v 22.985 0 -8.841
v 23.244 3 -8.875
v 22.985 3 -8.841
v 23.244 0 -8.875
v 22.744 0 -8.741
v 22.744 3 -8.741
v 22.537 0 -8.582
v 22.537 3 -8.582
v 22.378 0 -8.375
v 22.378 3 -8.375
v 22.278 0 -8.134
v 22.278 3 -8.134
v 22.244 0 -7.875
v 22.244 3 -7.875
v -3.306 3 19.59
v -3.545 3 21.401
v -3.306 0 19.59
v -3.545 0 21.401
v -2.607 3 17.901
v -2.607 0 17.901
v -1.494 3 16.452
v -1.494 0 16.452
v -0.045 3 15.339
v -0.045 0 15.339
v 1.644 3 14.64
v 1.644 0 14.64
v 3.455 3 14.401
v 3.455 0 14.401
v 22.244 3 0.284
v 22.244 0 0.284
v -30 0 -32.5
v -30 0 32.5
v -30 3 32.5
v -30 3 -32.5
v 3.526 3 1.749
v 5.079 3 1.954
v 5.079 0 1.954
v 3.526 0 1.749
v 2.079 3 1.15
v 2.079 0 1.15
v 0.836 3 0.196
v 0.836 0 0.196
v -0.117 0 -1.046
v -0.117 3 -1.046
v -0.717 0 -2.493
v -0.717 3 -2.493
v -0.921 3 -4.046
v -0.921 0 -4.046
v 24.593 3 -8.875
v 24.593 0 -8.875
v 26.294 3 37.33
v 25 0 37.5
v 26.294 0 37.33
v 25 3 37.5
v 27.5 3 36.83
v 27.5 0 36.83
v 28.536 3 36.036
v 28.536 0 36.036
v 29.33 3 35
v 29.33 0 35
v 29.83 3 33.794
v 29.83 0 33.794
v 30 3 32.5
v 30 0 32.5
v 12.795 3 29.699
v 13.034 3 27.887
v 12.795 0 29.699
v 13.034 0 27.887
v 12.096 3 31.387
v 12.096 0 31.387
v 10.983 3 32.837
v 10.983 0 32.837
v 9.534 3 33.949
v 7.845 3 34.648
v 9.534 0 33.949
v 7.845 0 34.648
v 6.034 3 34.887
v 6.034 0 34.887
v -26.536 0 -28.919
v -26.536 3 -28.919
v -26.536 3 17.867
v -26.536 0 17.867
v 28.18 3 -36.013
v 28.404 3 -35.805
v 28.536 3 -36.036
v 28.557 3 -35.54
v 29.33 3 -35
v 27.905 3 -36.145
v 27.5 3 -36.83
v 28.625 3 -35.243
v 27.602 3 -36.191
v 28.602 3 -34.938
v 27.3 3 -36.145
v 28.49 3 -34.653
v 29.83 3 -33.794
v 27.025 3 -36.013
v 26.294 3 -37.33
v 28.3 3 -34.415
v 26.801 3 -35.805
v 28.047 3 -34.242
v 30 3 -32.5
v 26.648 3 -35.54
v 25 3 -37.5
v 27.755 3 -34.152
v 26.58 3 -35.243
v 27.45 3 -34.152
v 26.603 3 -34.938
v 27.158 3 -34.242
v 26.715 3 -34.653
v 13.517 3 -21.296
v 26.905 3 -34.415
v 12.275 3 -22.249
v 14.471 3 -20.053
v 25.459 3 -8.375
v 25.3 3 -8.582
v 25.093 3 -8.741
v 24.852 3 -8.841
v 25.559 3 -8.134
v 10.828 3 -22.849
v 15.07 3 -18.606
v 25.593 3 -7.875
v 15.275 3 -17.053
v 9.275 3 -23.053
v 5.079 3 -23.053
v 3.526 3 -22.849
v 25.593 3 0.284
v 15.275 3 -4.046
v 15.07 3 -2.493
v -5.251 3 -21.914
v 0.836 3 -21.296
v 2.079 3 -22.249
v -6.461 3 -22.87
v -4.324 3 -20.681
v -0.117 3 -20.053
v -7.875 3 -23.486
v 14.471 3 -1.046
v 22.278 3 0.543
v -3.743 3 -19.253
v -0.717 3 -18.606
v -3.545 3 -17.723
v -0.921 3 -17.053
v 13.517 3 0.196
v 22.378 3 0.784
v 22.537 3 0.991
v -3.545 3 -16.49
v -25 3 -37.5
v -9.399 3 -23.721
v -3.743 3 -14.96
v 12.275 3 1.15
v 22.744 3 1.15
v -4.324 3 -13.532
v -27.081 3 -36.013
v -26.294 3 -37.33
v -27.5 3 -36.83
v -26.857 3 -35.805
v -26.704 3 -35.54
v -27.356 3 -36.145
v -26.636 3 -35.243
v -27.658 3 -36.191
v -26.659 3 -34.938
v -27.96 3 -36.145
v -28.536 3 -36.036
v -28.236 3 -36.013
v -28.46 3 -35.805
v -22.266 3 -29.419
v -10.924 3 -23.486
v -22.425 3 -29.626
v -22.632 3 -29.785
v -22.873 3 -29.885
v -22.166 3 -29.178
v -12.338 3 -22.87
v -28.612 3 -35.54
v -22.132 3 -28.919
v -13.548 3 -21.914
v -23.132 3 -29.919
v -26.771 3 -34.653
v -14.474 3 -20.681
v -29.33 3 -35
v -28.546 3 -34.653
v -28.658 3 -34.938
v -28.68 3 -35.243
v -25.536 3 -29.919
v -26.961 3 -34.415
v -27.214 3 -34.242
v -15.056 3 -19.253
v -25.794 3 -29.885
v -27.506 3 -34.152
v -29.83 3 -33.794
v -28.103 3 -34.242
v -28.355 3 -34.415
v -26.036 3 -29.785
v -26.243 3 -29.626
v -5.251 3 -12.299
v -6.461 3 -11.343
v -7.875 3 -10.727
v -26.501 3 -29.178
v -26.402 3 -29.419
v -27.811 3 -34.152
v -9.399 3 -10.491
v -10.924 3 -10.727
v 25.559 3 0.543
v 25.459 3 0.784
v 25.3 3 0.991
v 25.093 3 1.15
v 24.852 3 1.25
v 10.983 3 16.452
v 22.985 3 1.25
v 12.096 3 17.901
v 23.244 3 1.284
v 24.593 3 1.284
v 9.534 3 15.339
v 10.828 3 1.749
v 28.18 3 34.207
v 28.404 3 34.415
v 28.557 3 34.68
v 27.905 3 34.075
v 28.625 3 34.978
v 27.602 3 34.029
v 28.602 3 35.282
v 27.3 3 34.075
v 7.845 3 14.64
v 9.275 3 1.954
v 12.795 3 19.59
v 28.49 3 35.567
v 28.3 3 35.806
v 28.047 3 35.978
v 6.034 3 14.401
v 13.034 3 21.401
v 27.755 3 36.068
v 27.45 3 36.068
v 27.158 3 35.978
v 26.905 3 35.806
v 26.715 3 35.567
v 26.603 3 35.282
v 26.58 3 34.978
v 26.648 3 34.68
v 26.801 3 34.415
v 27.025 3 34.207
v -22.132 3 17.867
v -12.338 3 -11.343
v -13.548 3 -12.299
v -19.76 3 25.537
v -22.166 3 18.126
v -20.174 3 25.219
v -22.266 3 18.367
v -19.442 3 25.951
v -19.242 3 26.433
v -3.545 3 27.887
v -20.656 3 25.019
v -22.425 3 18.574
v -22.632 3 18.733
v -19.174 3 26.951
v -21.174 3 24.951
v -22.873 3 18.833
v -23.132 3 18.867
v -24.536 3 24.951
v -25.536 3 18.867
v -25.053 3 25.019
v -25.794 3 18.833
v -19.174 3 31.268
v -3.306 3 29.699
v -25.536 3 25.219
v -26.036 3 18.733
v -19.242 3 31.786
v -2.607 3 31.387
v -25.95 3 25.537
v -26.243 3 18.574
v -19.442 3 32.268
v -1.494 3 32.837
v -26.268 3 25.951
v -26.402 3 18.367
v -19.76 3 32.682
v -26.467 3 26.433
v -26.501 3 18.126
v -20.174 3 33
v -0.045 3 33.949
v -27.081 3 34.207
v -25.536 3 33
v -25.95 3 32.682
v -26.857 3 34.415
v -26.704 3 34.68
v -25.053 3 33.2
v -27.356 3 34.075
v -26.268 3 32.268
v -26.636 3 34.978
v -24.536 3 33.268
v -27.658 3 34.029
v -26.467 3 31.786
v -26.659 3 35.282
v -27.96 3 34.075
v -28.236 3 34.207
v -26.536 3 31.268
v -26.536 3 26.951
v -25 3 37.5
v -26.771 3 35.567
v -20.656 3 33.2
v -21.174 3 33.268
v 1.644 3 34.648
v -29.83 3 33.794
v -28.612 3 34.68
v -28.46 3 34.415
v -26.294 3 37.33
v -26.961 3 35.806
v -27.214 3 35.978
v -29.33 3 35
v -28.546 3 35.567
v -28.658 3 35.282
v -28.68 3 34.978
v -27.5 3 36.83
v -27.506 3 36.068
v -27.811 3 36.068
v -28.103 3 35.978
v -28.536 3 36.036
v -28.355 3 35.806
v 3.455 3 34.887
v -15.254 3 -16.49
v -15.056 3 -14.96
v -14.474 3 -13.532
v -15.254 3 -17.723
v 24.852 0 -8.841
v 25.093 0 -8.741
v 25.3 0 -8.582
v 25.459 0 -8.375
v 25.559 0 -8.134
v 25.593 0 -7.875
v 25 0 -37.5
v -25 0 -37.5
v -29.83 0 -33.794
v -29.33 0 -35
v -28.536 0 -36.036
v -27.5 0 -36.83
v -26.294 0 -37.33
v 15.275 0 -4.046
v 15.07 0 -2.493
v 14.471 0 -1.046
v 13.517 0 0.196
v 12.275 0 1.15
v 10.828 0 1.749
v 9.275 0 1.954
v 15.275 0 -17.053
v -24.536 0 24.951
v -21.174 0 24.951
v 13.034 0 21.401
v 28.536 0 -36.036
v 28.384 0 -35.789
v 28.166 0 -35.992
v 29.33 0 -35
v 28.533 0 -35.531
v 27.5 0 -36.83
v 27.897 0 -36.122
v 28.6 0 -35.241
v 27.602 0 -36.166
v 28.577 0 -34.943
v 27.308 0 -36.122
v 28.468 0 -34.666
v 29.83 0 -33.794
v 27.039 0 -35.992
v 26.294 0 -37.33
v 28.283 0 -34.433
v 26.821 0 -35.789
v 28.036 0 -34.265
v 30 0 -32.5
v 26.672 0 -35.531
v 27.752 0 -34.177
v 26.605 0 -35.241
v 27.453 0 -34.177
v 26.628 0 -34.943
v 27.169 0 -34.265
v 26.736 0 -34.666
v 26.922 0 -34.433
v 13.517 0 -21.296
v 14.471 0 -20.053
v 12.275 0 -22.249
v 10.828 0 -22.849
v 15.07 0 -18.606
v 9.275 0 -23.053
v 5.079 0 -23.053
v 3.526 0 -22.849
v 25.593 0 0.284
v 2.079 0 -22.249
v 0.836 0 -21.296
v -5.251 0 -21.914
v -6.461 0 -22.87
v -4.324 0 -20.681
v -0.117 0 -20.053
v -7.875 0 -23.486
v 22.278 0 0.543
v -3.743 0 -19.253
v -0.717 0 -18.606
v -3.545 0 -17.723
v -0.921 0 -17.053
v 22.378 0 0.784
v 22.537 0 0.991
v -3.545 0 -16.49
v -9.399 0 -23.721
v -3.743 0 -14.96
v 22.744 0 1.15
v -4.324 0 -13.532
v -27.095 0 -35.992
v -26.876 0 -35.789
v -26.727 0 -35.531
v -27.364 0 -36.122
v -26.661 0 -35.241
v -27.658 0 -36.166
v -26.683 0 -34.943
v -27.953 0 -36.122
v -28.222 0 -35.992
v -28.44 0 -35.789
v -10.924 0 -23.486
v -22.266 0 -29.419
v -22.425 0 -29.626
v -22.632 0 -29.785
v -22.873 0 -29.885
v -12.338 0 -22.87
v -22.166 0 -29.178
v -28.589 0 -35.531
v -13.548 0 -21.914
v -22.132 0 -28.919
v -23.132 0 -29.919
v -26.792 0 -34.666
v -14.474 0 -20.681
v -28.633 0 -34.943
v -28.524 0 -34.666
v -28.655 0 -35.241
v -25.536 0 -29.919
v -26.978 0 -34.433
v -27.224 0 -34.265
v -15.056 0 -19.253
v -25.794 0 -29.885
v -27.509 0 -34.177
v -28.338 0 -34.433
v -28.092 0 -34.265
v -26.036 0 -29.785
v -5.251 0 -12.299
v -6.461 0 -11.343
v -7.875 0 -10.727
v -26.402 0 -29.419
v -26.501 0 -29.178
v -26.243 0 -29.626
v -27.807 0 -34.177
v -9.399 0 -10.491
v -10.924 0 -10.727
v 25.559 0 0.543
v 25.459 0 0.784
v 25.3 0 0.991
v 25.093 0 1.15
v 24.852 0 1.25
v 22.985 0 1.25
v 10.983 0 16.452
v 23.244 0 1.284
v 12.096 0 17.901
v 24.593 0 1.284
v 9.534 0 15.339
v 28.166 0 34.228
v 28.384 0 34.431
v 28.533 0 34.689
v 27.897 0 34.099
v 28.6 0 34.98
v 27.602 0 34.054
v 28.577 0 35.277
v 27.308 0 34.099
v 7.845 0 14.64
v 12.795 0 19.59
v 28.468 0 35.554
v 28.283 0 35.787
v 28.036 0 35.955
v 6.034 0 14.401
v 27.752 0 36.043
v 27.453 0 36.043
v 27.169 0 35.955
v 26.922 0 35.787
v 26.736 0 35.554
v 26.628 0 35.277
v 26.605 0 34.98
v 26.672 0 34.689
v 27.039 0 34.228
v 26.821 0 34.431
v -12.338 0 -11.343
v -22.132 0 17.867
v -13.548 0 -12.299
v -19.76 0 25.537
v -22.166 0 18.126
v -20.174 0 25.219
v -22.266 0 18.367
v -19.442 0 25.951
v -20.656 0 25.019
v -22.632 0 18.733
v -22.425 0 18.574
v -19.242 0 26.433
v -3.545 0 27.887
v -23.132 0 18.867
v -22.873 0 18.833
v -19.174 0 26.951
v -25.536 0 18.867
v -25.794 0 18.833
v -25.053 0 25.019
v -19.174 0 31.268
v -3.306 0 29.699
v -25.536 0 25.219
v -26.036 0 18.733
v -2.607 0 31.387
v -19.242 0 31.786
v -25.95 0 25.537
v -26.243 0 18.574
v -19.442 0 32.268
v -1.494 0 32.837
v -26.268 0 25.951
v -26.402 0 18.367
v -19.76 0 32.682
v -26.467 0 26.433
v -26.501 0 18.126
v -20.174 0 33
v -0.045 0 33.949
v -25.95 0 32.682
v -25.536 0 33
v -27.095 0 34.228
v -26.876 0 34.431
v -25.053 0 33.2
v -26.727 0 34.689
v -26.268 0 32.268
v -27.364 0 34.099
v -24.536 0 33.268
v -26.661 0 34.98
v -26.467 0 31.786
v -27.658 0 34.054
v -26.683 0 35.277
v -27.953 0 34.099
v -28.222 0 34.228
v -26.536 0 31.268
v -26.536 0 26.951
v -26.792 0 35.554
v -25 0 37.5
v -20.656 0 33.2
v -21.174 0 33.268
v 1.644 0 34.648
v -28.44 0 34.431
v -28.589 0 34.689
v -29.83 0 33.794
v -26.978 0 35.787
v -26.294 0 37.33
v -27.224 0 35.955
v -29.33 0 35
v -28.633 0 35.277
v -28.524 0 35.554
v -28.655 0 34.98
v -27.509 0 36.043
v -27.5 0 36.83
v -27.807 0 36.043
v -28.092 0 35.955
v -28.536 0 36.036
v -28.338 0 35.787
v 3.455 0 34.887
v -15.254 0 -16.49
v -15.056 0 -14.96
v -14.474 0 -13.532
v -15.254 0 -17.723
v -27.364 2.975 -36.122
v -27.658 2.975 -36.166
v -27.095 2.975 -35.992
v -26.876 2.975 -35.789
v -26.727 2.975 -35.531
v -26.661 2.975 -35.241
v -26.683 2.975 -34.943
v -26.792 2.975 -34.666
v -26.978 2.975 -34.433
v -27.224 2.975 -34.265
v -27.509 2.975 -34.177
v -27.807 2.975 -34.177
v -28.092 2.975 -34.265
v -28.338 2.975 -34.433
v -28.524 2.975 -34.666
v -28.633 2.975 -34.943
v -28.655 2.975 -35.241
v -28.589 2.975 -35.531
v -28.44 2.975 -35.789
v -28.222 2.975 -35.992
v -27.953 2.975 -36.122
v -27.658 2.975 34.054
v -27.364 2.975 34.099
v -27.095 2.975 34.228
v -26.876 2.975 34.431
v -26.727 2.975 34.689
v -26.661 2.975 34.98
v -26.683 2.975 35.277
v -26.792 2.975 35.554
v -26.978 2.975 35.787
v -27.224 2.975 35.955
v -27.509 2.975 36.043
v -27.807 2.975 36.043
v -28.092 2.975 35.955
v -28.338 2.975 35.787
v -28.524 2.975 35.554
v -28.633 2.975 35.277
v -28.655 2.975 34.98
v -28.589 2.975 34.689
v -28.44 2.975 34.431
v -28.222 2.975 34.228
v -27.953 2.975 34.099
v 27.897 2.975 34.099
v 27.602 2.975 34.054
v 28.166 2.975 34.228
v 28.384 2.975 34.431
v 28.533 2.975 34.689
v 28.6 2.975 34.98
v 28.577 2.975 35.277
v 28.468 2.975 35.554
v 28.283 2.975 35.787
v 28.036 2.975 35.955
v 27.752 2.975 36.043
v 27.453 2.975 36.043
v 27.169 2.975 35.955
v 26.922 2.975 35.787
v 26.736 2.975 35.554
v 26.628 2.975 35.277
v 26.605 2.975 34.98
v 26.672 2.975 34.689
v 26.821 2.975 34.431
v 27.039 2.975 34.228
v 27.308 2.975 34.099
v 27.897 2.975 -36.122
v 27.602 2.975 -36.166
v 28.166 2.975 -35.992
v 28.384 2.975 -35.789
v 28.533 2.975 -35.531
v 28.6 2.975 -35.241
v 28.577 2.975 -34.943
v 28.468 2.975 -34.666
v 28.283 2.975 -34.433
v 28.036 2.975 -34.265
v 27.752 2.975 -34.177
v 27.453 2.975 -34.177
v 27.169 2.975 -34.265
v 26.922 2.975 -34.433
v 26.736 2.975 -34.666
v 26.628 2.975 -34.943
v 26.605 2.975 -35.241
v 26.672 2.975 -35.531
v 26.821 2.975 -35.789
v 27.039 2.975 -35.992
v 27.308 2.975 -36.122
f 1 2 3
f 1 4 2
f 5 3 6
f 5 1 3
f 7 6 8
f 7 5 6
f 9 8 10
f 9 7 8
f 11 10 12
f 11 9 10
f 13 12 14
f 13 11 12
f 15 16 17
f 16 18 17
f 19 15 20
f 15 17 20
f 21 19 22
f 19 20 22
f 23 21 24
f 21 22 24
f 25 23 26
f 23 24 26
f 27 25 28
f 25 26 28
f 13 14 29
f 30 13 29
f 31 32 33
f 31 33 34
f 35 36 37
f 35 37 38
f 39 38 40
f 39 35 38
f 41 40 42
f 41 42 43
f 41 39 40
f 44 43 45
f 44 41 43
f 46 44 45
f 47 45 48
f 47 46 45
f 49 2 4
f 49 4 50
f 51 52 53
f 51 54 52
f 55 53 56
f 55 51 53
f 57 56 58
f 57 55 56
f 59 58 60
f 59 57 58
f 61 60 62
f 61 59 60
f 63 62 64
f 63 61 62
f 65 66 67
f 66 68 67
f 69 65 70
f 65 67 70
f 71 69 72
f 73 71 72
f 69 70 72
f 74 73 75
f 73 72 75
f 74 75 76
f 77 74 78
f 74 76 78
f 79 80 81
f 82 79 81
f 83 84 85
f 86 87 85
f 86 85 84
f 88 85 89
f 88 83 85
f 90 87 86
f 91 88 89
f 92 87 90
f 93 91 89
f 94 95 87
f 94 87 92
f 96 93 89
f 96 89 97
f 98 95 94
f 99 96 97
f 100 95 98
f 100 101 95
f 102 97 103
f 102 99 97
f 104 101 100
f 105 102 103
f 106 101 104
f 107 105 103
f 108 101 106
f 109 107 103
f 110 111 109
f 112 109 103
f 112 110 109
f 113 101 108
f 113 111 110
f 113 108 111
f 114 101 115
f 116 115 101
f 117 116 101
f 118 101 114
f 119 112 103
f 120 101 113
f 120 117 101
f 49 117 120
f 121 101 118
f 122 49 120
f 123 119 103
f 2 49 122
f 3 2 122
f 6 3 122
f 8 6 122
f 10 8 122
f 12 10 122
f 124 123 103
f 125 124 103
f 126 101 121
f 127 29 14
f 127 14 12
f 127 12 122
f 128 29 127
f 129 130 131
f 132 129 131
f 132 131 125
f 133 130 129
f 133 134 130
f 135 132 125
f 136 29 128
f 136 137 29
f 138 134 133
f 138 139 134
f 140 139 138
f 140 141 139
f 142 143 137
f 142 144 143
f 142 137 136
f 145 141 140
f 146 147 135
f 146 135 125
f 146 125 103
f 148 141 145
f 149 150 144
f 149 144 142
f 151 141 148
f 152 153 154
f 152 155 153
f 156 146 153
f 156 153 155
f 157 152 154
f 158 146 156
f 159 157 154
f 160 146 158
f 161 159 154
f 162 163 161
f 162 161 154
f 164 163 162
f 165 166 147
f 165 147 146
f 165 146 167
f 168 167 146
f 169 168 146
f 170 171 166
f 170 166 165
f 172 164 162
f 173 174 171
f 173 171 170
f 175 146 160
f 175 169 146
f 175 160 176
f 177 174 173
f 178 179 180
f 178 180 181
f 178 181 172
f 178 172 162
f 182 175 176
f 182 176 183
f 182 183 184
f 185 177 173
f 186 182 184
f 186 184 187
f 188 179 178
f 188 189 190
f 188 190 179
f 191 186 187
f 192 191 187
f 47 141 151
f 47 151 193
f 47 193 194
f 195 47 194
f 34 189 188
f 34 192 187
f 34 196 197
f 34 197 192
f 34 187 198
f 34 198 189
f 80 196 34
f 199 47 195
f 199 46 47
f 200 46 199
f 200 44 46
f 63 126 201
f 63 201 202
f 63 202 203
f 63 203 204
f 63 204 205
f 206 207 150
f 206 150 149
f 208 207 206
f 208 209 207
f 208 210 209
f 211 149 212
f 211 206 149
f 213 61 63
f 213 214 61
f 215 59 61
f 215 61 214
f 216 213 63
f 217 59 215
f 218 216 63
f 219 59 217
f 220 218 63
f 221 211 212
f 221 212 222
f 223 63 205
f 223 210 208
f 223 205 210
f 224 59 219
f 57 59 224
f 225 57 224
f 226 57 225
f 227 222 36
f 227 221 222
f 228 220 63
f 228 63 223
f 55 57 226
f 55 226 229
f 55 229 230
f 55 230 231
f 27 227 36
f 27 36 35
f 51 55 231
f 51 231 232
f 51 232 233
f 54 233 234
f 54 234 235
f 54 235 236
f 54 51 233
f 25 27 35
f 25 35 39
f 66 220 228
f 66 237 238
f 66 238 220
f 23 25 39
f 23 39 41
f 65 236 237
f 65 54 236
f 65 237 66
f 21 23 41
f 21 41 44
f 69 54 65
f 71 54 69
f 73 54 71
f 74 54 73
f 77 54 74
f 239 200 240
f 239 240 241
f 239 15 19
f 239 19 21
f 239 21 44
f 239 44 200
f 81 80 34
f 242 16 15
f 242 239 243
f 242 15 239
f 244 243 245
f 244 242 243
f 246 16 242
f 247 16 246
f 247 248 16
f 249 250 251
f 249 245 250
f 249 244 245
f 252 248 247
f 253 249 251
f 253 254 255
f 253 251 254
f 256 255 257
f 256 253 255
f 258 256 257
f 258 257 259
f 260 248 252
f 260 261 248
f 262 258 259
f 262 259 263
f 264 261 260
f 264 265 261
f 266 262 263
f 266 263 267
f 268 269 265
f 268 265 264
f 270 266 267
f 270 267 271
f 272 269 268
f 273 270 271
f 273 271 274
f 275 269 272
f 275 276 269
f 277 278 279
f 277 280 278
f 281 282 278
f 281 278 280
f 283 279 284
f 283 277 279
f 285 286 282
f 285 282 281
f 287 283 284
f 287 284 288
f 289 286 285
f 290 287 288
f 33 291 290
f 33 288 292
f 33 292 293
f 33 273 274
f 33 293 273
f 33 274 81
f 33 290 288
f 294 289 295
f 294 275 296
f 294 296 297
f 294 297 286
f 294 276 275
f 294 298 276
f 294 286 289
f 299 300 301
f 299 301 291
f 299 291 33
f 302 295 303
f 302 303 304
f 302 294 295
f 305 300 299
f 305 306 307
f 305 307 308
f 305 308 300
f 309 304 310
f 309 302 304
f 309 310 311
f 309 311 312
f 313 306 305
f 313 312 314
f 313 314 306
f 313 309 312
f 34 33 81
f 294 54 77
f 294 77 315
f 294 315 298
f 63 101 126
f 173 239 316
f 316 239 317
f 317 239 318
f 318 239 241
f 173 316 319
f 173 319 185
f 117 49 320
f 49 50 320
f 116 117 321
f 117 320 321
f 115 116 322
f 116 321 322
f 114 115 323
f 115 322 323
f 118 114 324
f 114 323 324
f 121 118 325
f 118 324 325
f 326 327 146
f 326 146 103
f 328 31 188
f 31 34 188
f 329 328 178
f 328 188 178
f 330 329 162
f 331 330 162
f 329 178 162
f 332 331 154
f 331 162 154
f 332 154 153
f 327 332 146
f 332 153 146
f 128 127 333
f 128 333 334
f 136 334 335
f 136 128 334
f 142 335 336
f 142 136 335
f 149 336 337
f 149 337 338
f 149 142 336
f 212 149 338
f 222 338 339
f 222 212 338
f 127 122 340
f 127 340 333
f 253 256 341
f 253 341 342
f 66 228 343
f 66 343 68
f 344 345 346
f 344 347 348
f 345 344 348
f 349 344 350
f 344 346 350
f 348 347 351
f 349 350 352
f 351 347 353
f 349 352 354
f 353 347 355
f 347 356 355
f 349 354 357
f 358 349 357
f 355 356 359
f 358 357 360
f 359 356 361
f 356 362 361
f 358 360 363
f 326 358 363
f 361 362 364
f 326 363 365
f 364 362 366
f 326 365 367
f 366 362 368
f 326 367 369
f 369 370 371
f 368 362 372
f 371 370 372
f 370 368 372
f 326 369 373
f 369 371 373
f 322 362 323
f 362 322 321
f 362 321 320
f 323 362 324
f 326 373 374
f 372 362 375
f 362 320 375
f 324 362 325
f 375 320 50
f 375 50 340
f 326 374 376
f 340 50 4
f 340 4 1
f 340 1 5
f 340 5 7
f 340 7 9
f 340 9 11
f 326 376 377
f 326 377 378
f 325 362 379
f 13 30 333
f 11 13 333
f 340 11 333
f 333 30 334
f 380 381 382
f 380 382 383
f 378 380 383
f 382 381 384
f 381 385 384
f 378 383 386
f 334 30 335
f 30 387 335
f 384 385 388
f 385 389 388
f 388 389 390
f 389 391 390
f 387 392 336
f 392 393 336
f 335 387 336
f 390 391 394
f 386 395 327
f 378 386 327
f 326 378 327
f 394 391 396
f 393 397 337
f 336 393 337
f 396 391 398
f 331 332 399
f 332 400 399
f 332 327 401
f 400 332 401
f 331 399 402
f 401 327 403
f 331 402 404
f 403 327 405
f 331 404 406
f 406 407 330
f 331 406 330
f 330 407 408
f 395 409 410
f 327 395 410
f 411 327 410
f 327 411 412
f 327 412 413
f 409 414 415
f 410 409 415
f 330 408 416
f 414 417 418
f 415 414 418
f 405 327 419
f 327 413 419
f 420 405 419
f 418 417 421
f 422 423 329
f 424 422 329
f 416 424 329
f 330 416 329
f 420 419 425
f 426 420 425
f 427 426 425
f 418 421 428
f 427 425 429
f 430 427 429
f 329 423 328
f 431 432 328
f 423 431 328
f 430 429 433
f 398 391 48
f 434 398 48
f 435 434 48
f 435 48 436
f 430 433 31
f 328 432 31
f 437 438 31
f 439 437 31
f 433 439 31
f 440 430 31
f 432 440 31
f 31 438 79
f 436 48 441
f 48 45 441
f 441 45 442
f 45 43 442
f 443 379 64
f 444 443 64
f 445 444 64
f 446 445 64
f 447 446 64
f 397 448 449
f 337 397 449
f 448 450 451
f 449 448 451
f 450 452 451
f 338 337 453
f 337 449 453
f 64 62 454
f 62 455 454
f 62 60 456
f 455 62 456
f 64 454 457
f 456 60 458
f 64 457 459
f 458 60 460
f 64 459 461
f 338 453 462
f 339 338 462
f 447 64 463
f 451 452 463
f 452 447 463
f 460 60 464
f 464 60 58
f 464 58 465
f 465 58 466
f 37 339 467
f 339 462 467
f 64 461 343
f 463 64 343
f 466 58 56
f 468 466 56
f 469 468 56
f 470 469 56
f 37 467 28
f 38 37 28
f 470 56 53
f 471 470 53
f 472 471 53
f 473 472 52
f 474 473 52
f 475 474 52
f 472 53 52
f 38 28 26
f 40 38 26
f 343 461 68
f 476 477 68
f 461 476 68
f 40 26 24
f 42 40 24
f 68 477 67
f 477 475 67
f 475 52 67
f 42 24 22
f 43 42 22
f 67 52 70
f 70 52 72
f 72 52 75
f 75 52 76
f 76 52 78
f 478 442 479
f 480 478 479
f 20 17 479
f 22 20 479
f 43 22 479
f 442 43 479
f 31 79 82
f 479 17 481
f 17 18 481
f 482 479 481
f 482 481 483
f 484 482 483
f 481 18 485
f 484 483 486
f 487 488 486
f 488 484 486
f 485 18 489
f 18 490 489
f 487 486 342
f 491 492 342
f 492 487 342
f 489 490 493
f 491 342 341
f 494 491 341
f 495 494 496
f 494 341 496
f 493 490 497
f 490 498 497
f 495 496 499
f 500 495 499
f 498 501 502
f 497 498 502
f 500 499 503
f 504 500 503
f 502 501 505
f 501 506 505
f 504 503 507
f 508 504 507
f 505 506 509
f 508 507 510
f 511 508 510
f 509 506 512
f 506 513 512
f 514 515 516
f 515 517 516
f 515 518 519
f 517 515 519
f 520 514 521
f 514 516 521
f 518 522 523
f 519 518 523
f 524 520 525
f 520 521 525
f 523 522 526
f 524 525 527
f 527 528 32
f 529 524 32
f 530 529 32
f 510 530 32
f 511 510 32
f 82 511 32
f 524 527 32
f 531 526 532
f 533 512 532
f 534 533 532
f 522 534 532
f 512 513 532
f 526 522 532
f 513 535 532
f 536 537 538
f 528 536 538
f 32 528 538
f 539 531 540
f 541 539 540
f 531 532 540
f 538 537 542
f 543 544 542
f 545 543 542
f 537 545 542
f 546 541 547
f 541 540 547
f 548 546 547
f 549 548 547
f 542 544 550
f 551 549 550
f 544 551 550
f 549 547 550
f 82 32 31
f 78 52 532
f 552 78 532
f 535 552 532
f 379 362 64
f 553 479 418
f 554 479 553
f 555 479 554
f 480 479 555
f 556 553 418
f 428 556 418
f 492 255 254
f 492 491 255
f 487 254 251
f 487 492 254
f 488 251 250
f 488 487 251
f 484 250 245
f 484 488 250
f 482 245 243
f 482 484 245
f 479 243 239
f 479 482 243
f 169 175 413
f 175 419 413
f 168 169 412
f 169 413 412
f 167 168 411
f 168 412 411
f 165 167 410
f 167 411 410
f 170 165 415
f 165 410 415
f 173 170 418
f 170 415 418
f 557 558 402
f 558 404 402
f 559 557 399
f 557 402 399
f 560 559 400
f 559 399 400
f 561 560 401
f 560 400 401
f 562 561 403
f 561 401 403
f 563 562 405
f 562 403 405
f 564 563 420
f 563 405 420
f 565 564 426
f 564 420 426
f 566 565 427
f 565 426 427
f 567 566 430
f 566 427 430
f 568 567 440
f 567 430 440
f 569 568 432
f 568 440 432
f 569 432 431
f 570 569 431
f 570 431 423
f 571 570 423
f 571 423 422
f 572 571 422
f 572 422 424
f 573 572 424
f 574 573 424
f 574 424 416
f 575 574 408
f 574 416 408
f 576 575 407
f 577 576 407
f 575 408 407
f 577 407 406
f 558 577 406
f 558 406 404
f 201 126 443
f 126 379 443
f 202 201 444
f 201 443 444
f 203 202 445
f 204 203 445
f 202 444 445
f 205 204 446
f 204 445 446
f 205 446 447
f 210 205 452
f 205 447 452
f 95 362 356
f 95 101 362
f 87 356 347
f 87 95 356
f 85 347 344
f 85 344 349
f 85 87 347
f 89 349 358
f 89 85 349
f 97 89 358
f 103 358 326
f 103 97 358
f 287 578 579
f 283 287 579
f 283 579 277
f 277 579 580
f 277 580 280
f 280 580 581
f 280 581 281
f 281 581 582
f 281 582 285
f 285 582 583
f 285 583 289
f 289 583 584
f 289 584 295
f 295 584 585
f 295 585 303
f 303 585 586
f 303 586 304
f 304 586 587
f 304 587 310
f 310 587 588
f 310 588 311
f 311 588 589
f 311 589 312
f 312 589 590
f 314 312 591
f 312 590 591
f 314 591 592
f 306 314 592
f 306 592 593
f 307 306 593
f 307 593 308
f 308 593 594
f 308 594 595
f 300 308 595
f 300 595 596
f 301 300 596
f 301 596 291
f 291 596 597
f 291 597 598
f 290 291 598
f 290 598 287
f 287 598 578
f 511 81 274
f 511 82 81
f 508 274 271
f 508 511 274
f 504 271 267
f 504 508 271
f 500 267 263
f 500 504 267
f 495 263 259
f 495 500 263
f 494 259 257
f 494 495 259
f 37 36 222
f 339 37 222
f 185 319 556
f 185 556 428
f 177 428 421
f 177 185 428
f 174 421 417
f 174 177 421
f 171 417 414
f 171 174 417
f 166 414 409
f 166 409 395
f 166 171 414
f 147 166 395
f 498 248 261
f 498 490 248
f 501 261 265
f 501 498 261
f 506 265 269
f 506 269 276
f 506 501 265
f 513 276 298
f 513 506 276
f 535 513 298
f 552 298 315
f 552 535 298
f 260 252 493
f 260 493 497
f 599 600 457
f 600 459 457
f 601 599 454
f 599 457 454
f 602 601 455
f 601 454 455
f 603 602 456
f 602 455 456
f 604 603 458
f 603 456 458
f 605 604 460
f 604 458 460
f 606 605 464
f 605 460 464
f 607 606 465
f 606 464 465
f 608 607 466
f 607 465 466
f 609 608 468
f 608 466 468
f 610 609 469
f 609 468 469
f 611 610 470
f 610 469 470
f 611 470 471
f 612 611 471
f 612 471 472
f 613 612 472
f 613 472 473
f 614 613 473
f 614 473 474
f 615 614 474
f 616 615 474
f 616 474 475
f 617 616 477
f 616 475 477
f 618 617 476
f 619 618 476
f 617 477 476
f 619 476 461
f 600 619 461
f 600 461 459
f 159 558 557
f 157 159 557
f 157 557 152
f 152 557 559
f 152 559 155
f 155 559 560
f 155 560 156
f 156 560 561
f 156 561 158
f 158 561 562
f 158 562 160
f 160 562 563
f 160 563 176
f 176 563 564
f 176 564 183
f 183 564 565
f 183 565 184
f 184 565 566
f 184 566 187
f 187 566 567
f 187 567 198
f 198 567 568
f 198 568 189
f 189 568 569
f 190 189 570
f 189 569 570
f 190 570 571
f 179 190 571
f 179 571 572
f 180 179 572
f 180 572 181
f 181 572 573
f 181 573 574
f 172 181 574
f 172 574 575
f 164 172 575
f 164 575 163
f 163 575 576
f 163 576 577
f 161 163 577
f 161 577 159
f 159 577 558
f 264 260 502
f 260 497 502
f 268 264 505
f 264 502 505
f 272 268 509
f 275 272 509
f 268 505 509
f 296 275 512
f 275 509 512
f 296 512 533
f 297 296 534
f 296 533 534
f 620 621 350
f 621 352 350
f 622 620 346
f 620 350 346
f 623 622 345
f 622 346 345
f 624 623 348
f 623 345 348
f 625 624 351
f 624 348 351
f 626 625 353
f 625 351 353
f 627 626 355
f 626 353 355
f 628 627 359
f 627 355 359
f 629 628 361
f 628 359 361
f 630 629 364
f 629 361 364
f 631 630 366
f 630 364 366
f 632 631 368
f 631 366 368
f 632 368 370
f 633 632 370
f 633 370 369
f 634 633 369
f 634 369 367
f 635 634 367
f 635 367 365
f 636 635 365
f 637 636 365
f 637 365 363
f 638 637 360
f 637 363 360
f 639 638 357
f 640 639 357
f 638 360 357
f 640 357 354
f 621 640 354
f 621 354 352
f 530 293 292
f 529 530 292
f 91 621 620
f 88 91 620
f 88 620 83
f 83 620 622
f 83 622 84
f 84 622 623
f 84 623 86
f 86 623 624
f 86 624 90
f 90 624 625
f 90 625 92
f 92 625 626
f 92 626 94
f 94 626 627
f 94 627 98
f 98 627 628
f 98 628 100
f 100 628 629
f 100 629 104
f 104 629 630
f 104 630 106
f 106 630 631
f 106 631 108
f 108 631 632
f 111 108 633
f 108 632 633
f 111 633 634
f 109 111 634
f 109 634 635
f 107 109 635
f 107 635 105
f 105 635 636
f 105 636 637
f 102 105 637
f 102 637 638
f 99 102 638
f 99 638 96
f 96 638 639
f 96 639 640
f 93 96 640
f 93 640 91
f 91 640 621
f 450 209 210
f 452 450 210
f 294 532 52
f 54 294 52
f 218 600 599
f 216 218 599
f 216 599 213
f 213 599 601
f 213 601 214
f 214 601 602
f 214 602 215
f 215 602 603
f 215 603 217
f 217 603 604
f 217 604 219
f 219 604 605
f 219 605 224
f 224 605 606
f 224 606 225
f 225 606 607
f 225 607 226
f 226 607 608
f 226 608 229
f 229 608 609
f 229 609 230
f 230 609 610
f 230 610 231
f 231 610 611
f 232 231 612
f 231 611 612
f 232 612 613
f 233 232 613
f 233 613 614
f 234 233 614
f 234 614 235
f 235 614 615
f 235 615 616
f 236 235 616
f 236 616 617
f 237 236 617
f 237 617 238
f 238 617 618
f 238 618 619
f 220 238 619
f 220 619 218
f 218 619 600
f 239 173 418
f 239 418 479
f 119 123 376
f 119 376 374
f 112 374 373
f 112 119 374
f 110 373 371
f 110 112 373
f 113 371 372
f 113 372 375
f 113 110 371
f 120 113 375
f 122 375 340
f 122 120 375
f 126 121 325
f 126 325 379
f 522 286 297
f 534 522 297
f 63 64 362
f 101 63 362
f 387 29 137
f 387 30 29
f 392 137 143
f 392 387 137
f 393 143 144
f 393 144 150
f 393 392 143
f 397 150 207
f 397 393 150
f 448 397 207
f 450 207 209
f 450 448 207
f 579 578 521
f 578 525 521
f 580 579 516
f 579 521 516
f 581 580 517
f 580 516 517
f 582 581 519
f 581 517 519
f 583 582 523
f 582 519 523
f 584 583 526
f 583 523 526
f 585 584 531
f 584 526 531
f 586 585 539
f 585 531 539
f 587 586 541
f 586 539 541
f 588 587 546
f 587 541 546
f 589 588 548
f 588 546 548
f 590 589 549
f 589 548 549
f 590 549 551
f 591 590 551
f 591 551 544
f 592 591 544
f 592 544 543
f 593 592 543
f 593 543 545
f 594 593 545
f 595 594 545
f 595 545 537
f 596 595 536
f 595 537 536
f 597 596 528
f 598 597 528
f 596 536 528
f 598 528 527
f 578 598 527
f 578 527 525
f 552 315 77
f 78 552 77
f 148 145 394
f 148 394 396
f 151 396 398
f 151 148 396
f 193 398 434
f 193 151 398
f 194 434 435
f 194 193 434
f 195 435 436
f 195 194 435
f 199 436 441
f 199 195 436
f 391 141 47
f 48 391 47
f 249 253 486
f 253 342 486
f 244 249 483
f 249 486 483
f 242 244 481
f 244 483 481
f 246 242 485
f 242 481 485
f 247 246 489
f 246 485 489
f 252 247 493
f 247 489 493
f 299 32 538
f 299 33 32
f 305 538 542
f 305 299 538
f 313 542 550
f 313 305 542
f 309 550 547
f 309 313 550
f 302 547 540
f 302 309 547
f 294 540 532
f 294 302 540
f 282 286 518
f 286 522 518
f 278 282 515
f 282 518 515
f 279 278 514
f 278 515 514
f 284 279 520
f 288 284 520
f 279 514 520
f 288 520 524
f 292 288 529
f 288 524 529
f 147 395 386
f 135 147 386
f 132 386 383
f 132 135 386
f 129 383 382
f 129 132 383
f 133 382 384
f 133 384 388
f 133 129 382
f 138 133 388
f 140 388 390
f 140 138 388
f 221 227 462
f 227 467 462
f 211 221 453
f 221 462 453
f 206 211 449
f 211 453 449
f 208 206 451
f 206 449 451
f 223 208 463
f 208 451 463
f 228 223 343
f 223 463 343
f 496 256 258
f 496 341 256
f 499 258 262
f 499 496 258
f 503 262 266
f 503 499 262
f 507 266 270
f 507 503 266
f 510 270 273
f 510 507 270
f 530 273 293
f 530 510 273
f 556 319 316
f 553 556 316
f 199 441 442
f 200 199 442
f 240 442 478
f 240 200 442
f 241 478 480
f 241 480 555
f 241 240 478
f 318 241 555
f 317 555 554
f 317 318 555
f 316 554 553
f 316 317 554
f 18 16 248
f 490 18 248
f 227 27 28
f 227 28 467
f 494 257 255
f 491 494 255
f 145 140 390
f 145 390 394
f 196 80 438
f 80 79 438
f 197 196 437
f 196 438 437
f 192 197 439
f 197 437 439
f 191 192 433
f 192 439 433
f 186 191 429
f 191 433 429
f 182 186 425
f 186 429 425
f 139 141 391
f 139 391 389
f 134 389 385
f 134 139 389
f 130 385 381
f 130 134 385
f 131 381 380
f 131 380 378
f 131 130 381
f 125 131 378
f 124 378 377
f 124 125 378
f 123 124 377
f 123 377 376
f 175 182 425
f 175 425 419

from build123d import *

# Parameters (mm, degrees)
SKIZZE1_W                                = 60
SKIZZE1_H                                = 75
AUFSATZ_LINEAR_AUSTRAGEN1_DEPTH          = 3
VERRUNDUNG1_R                            = 5
F_2_0_2_DURCHMESSER_BOHRUNG1_D           = 2
F_2_0_2_DURCHMESSER_BOHRUNG1_DEPTH       = 20
F_2_0_2_DURCHMESSER_BOHRUNG1_CSINK_D     = 2.05
F_2_0_2_DURCHMESSER_BOHRUNG1_CSINK_ANGLE = 90
F_2_0_2_DURCHMESSER_BOHRUNG1_TIP         = 0.600860619
SKIZZE4_W                                = 25.006881973
SKIZZE4_H                                = 16.195641819
SKIZZE4_W_2                              = 8.317021013
SKIZZE4_H_2                              = 7.361730429
SKIZZE4_W_3                              = 20.485548402
SKIZZE4_H_3                              = 16.578223094
SKIZZE4_W_4                              = 10.159045801
SKIZZE4_H_4                              = 3.349135978
SKIZZE4_W_5                              = 48.785747421
SKIZZE4_H_5                              = 4.403326981
SKIZZE4_W_6                              = 13.233304068
SKIZZE4_H_6                              = 11.709766254
SCHNITT_LINEAR_AUSTRAGEN1_DEPTH          = 5
VERRUNDUNG2_R                            = 6
VERRUNDUNG3_R                            = 1
VERRUNDUNG4_R                            = 7
VERRUNDUNG5_R                            = 2


with BuildPart() as part:
    # Skizze1 → Aufsatz-Linear austragen1 (new body)
    with BuildSketch(Plane(origin=(0, 0, 0), x_dir=(1, 0, 0), z_dir=(0, 1, 0))):
        Rectangle(SKIZZE1_W, SKIZZE1_H)
    extrude(amount=AUFSATZ_LINEAR_AUSTRAGEN1_DEPTH)

    # Verrundung1
    verrundung1_edges = [part.edges().sort_by_distance(p)[0] for p in [
        (30, 1.5, 37.5),
        (-30, 1.5, 37.5),
        (-30, 1.5, -37.5),
        (30, 1.5, -37.5),
    ]]
    fillet(verrundung1_edges, radius=VERRUNDUNG1_R)

    # Ø2.0 (2) Durchmesser Bohrung1
    with Locations(Plane.ZX.offset(3)):
        with Locations((-35.165927774, 27.602462356), (35.054289908, 27.602462356), (35.054289908, -27.658281289), (-35.165927774, -27.658281289)):
            CounterSinkHole(F_2_0_2_DURCHMESSER_BOHRUNG1_D / 2, F_2_0_2_DURCHMESSER_BOHRUNG1_CSINK_D / 2, depth=F_2_0_2_DURCHMESSER_BOHRUNG1_DEPTH, counter_sink_angle=F_2_0_2_DURCHMESSER_BOHRUNG1_CSINK_ANGLE)
            with Locations((0, 0, -(F_2_0_2_DURCHMESSER_BOHRUNG1_DEPTH + F_2_0_2_DURCHMESSER_BOHRUNG1_TIP / 2))):  # 118° drill point
                Cone(0, F_2_0_2_DURCHMESSER_BOHRUNG1_D / 2, F_2_0_2_DURCHMESSER_BOHRUNG1_TIP, mode=Mode.SUBTRACT)

    # Skizze4 → Schnitt-Linear austragen1 (cut)
    with BuildSketch(Plane.ZX.offset(3)):
        with Locations((-10.549778333, 7.176808516)):
            Rectangle(SKIZZE4_W, SKIZZE4_H)
        with Locations((29.109573547, -22.854668692)):
            Rectangle(SKIZZE4_W_2, SKIZZE4_H_2)
        with Locations((24.644058909, 4.744609303)):
            Rectangle(SKIZZE4_W_3, SKIZZE4_H_3)
        with Locations((-3.795687443, 23.91841278)):
            Rectangle(SKIZZE4_W_4, SKIZZE4_H_4)
        with Locations((-5.526074365, -24.333870416)):
            Rectangle(SKIZZE4_W_5, SKIZZE4_H_5)
        with Locations((-17.106394481, -9.399385371)):
            Rectangle(SKIZZE4_W_6, SKIZZE4_H_6)
    extrude(amount=-SCHNITT_LINEAR_AUSTRAGEN1_DEPTH, mode=Mode.SUBTRACT)

    # Verrundung2
    # the kernel refuses this fillet: 6 mm, written as the material it adds along each edge
    with BuildSketch(Plane(origin=(-15.254268498, 3, -23.723046515), x_dir=(1, 0, 0), z_dir=(0, -1, 0)), Plane(origin=(-3.544502244, 3, -23.723046515), x_dir=(0, 0, 1), z_dir=(0, -1, 0)), Plane(origin=(-3.544502244, 3, -10.489742447), x_dir=(-1, 0, 0), z_dir=(0, -1, 0)), Plane(origin=(-0.921012394, 3, -23.053219319), x_dir=(1, 0, 0), z_dir=(0, -1, 0)), Plane(origin=(15.274629425, 3, -23.053219319), x_dir=(0, 0, 1), z_dir=(0, -1, 0)), Plane(origin=(15.274629425, 3, 1.953662654), x_dir=(-1, 0, 0), z_dir=(0, -1, 0))) as verrundung2_piece_1:
        with BuildLine():
            CenterArc((VERRUNDUNG2_R, VERRUNDUNG2_R), VERRUNDUNG2_R, 180, 90)
            Line((0, VERRUNDUNG2_R), (0, 0))
            Line((0, 0), (VERRUNDUNG2_R, 0))
        make_face()
    extrude(amount=3)
    with BuildSketch(Plane(origin=(-15.254268498, 3, -10.489742447), x_dir=(1, 0, 0), z_dir=(0, -1, 0)), Plane(origin=(-0.921012394, 3, 1.953662654), x_dir=(1, 0, 0), z_dir=(0, -1, 0))) as verrundung2_piece_2:
        with BuildLine():
            CenterArc((VERRUNDUNG2_R, -VERRUNDUNG2_R), VERRUNDUNG2_R, 90, 90)
            Line((0, -VERRUNDUNG2_R), (0, 0))
            Line((0, 0), (VERRUNDUNG2_R, 0))
        make_face()
    extrude(amount=3)

    # Verrundung3
    verrundung3_edges = [part.edges().sort_by_distance(p)[0] for p in [
        (-26.535533906, 1.5, -29.918948075),
        (-22.132206925, 1.5, -29.918948075),
        (-22.132206925, 1.5, 18.866799346),
        (-26.535533906, 1.5, 18.866799346),
        (22.243844791, 1.5, -8.875210343),
        (25.592980769, 1.5, -8.875210343),
        (25.592980769, 1.5, 1.283835458),
        (22.243844791, 1.5, 1.283835458),
    ]]
    fillet(verrundung3_edges, radius=VERRUNDUNG3_R)

    # Verrundung4
    verrundung4_edges = [part.edges().sort_by_distance(p)[0] for p in [
        (-3.544502244, 1.5, 14.401284708),
        (13.03372085, 1.5, 14.401284708),
        (13.03372085, 1.5, 34.88683311),
        (-3.544502244, 1.5, 34.88683311),
    ]]
    fillet(verrundung4_edges, radius=VERRUNDUNG4_R)

    # Verrundung5
    verrundung5_edges = [part.edges().sort_by_distance(p)[0] for p in [
        (-26.535533906, 1.5, 24.95106304),
        (-19.173803477, 1.5, 24.95106304),
        (-19.173803477, 1.5, 33.268084053),
        (-26.535533906, 1.5, 33.268084053),
    ]]
    fillet(verrundung5_edges, radius=VERRUNDUNG5_R)


solid = part.part
